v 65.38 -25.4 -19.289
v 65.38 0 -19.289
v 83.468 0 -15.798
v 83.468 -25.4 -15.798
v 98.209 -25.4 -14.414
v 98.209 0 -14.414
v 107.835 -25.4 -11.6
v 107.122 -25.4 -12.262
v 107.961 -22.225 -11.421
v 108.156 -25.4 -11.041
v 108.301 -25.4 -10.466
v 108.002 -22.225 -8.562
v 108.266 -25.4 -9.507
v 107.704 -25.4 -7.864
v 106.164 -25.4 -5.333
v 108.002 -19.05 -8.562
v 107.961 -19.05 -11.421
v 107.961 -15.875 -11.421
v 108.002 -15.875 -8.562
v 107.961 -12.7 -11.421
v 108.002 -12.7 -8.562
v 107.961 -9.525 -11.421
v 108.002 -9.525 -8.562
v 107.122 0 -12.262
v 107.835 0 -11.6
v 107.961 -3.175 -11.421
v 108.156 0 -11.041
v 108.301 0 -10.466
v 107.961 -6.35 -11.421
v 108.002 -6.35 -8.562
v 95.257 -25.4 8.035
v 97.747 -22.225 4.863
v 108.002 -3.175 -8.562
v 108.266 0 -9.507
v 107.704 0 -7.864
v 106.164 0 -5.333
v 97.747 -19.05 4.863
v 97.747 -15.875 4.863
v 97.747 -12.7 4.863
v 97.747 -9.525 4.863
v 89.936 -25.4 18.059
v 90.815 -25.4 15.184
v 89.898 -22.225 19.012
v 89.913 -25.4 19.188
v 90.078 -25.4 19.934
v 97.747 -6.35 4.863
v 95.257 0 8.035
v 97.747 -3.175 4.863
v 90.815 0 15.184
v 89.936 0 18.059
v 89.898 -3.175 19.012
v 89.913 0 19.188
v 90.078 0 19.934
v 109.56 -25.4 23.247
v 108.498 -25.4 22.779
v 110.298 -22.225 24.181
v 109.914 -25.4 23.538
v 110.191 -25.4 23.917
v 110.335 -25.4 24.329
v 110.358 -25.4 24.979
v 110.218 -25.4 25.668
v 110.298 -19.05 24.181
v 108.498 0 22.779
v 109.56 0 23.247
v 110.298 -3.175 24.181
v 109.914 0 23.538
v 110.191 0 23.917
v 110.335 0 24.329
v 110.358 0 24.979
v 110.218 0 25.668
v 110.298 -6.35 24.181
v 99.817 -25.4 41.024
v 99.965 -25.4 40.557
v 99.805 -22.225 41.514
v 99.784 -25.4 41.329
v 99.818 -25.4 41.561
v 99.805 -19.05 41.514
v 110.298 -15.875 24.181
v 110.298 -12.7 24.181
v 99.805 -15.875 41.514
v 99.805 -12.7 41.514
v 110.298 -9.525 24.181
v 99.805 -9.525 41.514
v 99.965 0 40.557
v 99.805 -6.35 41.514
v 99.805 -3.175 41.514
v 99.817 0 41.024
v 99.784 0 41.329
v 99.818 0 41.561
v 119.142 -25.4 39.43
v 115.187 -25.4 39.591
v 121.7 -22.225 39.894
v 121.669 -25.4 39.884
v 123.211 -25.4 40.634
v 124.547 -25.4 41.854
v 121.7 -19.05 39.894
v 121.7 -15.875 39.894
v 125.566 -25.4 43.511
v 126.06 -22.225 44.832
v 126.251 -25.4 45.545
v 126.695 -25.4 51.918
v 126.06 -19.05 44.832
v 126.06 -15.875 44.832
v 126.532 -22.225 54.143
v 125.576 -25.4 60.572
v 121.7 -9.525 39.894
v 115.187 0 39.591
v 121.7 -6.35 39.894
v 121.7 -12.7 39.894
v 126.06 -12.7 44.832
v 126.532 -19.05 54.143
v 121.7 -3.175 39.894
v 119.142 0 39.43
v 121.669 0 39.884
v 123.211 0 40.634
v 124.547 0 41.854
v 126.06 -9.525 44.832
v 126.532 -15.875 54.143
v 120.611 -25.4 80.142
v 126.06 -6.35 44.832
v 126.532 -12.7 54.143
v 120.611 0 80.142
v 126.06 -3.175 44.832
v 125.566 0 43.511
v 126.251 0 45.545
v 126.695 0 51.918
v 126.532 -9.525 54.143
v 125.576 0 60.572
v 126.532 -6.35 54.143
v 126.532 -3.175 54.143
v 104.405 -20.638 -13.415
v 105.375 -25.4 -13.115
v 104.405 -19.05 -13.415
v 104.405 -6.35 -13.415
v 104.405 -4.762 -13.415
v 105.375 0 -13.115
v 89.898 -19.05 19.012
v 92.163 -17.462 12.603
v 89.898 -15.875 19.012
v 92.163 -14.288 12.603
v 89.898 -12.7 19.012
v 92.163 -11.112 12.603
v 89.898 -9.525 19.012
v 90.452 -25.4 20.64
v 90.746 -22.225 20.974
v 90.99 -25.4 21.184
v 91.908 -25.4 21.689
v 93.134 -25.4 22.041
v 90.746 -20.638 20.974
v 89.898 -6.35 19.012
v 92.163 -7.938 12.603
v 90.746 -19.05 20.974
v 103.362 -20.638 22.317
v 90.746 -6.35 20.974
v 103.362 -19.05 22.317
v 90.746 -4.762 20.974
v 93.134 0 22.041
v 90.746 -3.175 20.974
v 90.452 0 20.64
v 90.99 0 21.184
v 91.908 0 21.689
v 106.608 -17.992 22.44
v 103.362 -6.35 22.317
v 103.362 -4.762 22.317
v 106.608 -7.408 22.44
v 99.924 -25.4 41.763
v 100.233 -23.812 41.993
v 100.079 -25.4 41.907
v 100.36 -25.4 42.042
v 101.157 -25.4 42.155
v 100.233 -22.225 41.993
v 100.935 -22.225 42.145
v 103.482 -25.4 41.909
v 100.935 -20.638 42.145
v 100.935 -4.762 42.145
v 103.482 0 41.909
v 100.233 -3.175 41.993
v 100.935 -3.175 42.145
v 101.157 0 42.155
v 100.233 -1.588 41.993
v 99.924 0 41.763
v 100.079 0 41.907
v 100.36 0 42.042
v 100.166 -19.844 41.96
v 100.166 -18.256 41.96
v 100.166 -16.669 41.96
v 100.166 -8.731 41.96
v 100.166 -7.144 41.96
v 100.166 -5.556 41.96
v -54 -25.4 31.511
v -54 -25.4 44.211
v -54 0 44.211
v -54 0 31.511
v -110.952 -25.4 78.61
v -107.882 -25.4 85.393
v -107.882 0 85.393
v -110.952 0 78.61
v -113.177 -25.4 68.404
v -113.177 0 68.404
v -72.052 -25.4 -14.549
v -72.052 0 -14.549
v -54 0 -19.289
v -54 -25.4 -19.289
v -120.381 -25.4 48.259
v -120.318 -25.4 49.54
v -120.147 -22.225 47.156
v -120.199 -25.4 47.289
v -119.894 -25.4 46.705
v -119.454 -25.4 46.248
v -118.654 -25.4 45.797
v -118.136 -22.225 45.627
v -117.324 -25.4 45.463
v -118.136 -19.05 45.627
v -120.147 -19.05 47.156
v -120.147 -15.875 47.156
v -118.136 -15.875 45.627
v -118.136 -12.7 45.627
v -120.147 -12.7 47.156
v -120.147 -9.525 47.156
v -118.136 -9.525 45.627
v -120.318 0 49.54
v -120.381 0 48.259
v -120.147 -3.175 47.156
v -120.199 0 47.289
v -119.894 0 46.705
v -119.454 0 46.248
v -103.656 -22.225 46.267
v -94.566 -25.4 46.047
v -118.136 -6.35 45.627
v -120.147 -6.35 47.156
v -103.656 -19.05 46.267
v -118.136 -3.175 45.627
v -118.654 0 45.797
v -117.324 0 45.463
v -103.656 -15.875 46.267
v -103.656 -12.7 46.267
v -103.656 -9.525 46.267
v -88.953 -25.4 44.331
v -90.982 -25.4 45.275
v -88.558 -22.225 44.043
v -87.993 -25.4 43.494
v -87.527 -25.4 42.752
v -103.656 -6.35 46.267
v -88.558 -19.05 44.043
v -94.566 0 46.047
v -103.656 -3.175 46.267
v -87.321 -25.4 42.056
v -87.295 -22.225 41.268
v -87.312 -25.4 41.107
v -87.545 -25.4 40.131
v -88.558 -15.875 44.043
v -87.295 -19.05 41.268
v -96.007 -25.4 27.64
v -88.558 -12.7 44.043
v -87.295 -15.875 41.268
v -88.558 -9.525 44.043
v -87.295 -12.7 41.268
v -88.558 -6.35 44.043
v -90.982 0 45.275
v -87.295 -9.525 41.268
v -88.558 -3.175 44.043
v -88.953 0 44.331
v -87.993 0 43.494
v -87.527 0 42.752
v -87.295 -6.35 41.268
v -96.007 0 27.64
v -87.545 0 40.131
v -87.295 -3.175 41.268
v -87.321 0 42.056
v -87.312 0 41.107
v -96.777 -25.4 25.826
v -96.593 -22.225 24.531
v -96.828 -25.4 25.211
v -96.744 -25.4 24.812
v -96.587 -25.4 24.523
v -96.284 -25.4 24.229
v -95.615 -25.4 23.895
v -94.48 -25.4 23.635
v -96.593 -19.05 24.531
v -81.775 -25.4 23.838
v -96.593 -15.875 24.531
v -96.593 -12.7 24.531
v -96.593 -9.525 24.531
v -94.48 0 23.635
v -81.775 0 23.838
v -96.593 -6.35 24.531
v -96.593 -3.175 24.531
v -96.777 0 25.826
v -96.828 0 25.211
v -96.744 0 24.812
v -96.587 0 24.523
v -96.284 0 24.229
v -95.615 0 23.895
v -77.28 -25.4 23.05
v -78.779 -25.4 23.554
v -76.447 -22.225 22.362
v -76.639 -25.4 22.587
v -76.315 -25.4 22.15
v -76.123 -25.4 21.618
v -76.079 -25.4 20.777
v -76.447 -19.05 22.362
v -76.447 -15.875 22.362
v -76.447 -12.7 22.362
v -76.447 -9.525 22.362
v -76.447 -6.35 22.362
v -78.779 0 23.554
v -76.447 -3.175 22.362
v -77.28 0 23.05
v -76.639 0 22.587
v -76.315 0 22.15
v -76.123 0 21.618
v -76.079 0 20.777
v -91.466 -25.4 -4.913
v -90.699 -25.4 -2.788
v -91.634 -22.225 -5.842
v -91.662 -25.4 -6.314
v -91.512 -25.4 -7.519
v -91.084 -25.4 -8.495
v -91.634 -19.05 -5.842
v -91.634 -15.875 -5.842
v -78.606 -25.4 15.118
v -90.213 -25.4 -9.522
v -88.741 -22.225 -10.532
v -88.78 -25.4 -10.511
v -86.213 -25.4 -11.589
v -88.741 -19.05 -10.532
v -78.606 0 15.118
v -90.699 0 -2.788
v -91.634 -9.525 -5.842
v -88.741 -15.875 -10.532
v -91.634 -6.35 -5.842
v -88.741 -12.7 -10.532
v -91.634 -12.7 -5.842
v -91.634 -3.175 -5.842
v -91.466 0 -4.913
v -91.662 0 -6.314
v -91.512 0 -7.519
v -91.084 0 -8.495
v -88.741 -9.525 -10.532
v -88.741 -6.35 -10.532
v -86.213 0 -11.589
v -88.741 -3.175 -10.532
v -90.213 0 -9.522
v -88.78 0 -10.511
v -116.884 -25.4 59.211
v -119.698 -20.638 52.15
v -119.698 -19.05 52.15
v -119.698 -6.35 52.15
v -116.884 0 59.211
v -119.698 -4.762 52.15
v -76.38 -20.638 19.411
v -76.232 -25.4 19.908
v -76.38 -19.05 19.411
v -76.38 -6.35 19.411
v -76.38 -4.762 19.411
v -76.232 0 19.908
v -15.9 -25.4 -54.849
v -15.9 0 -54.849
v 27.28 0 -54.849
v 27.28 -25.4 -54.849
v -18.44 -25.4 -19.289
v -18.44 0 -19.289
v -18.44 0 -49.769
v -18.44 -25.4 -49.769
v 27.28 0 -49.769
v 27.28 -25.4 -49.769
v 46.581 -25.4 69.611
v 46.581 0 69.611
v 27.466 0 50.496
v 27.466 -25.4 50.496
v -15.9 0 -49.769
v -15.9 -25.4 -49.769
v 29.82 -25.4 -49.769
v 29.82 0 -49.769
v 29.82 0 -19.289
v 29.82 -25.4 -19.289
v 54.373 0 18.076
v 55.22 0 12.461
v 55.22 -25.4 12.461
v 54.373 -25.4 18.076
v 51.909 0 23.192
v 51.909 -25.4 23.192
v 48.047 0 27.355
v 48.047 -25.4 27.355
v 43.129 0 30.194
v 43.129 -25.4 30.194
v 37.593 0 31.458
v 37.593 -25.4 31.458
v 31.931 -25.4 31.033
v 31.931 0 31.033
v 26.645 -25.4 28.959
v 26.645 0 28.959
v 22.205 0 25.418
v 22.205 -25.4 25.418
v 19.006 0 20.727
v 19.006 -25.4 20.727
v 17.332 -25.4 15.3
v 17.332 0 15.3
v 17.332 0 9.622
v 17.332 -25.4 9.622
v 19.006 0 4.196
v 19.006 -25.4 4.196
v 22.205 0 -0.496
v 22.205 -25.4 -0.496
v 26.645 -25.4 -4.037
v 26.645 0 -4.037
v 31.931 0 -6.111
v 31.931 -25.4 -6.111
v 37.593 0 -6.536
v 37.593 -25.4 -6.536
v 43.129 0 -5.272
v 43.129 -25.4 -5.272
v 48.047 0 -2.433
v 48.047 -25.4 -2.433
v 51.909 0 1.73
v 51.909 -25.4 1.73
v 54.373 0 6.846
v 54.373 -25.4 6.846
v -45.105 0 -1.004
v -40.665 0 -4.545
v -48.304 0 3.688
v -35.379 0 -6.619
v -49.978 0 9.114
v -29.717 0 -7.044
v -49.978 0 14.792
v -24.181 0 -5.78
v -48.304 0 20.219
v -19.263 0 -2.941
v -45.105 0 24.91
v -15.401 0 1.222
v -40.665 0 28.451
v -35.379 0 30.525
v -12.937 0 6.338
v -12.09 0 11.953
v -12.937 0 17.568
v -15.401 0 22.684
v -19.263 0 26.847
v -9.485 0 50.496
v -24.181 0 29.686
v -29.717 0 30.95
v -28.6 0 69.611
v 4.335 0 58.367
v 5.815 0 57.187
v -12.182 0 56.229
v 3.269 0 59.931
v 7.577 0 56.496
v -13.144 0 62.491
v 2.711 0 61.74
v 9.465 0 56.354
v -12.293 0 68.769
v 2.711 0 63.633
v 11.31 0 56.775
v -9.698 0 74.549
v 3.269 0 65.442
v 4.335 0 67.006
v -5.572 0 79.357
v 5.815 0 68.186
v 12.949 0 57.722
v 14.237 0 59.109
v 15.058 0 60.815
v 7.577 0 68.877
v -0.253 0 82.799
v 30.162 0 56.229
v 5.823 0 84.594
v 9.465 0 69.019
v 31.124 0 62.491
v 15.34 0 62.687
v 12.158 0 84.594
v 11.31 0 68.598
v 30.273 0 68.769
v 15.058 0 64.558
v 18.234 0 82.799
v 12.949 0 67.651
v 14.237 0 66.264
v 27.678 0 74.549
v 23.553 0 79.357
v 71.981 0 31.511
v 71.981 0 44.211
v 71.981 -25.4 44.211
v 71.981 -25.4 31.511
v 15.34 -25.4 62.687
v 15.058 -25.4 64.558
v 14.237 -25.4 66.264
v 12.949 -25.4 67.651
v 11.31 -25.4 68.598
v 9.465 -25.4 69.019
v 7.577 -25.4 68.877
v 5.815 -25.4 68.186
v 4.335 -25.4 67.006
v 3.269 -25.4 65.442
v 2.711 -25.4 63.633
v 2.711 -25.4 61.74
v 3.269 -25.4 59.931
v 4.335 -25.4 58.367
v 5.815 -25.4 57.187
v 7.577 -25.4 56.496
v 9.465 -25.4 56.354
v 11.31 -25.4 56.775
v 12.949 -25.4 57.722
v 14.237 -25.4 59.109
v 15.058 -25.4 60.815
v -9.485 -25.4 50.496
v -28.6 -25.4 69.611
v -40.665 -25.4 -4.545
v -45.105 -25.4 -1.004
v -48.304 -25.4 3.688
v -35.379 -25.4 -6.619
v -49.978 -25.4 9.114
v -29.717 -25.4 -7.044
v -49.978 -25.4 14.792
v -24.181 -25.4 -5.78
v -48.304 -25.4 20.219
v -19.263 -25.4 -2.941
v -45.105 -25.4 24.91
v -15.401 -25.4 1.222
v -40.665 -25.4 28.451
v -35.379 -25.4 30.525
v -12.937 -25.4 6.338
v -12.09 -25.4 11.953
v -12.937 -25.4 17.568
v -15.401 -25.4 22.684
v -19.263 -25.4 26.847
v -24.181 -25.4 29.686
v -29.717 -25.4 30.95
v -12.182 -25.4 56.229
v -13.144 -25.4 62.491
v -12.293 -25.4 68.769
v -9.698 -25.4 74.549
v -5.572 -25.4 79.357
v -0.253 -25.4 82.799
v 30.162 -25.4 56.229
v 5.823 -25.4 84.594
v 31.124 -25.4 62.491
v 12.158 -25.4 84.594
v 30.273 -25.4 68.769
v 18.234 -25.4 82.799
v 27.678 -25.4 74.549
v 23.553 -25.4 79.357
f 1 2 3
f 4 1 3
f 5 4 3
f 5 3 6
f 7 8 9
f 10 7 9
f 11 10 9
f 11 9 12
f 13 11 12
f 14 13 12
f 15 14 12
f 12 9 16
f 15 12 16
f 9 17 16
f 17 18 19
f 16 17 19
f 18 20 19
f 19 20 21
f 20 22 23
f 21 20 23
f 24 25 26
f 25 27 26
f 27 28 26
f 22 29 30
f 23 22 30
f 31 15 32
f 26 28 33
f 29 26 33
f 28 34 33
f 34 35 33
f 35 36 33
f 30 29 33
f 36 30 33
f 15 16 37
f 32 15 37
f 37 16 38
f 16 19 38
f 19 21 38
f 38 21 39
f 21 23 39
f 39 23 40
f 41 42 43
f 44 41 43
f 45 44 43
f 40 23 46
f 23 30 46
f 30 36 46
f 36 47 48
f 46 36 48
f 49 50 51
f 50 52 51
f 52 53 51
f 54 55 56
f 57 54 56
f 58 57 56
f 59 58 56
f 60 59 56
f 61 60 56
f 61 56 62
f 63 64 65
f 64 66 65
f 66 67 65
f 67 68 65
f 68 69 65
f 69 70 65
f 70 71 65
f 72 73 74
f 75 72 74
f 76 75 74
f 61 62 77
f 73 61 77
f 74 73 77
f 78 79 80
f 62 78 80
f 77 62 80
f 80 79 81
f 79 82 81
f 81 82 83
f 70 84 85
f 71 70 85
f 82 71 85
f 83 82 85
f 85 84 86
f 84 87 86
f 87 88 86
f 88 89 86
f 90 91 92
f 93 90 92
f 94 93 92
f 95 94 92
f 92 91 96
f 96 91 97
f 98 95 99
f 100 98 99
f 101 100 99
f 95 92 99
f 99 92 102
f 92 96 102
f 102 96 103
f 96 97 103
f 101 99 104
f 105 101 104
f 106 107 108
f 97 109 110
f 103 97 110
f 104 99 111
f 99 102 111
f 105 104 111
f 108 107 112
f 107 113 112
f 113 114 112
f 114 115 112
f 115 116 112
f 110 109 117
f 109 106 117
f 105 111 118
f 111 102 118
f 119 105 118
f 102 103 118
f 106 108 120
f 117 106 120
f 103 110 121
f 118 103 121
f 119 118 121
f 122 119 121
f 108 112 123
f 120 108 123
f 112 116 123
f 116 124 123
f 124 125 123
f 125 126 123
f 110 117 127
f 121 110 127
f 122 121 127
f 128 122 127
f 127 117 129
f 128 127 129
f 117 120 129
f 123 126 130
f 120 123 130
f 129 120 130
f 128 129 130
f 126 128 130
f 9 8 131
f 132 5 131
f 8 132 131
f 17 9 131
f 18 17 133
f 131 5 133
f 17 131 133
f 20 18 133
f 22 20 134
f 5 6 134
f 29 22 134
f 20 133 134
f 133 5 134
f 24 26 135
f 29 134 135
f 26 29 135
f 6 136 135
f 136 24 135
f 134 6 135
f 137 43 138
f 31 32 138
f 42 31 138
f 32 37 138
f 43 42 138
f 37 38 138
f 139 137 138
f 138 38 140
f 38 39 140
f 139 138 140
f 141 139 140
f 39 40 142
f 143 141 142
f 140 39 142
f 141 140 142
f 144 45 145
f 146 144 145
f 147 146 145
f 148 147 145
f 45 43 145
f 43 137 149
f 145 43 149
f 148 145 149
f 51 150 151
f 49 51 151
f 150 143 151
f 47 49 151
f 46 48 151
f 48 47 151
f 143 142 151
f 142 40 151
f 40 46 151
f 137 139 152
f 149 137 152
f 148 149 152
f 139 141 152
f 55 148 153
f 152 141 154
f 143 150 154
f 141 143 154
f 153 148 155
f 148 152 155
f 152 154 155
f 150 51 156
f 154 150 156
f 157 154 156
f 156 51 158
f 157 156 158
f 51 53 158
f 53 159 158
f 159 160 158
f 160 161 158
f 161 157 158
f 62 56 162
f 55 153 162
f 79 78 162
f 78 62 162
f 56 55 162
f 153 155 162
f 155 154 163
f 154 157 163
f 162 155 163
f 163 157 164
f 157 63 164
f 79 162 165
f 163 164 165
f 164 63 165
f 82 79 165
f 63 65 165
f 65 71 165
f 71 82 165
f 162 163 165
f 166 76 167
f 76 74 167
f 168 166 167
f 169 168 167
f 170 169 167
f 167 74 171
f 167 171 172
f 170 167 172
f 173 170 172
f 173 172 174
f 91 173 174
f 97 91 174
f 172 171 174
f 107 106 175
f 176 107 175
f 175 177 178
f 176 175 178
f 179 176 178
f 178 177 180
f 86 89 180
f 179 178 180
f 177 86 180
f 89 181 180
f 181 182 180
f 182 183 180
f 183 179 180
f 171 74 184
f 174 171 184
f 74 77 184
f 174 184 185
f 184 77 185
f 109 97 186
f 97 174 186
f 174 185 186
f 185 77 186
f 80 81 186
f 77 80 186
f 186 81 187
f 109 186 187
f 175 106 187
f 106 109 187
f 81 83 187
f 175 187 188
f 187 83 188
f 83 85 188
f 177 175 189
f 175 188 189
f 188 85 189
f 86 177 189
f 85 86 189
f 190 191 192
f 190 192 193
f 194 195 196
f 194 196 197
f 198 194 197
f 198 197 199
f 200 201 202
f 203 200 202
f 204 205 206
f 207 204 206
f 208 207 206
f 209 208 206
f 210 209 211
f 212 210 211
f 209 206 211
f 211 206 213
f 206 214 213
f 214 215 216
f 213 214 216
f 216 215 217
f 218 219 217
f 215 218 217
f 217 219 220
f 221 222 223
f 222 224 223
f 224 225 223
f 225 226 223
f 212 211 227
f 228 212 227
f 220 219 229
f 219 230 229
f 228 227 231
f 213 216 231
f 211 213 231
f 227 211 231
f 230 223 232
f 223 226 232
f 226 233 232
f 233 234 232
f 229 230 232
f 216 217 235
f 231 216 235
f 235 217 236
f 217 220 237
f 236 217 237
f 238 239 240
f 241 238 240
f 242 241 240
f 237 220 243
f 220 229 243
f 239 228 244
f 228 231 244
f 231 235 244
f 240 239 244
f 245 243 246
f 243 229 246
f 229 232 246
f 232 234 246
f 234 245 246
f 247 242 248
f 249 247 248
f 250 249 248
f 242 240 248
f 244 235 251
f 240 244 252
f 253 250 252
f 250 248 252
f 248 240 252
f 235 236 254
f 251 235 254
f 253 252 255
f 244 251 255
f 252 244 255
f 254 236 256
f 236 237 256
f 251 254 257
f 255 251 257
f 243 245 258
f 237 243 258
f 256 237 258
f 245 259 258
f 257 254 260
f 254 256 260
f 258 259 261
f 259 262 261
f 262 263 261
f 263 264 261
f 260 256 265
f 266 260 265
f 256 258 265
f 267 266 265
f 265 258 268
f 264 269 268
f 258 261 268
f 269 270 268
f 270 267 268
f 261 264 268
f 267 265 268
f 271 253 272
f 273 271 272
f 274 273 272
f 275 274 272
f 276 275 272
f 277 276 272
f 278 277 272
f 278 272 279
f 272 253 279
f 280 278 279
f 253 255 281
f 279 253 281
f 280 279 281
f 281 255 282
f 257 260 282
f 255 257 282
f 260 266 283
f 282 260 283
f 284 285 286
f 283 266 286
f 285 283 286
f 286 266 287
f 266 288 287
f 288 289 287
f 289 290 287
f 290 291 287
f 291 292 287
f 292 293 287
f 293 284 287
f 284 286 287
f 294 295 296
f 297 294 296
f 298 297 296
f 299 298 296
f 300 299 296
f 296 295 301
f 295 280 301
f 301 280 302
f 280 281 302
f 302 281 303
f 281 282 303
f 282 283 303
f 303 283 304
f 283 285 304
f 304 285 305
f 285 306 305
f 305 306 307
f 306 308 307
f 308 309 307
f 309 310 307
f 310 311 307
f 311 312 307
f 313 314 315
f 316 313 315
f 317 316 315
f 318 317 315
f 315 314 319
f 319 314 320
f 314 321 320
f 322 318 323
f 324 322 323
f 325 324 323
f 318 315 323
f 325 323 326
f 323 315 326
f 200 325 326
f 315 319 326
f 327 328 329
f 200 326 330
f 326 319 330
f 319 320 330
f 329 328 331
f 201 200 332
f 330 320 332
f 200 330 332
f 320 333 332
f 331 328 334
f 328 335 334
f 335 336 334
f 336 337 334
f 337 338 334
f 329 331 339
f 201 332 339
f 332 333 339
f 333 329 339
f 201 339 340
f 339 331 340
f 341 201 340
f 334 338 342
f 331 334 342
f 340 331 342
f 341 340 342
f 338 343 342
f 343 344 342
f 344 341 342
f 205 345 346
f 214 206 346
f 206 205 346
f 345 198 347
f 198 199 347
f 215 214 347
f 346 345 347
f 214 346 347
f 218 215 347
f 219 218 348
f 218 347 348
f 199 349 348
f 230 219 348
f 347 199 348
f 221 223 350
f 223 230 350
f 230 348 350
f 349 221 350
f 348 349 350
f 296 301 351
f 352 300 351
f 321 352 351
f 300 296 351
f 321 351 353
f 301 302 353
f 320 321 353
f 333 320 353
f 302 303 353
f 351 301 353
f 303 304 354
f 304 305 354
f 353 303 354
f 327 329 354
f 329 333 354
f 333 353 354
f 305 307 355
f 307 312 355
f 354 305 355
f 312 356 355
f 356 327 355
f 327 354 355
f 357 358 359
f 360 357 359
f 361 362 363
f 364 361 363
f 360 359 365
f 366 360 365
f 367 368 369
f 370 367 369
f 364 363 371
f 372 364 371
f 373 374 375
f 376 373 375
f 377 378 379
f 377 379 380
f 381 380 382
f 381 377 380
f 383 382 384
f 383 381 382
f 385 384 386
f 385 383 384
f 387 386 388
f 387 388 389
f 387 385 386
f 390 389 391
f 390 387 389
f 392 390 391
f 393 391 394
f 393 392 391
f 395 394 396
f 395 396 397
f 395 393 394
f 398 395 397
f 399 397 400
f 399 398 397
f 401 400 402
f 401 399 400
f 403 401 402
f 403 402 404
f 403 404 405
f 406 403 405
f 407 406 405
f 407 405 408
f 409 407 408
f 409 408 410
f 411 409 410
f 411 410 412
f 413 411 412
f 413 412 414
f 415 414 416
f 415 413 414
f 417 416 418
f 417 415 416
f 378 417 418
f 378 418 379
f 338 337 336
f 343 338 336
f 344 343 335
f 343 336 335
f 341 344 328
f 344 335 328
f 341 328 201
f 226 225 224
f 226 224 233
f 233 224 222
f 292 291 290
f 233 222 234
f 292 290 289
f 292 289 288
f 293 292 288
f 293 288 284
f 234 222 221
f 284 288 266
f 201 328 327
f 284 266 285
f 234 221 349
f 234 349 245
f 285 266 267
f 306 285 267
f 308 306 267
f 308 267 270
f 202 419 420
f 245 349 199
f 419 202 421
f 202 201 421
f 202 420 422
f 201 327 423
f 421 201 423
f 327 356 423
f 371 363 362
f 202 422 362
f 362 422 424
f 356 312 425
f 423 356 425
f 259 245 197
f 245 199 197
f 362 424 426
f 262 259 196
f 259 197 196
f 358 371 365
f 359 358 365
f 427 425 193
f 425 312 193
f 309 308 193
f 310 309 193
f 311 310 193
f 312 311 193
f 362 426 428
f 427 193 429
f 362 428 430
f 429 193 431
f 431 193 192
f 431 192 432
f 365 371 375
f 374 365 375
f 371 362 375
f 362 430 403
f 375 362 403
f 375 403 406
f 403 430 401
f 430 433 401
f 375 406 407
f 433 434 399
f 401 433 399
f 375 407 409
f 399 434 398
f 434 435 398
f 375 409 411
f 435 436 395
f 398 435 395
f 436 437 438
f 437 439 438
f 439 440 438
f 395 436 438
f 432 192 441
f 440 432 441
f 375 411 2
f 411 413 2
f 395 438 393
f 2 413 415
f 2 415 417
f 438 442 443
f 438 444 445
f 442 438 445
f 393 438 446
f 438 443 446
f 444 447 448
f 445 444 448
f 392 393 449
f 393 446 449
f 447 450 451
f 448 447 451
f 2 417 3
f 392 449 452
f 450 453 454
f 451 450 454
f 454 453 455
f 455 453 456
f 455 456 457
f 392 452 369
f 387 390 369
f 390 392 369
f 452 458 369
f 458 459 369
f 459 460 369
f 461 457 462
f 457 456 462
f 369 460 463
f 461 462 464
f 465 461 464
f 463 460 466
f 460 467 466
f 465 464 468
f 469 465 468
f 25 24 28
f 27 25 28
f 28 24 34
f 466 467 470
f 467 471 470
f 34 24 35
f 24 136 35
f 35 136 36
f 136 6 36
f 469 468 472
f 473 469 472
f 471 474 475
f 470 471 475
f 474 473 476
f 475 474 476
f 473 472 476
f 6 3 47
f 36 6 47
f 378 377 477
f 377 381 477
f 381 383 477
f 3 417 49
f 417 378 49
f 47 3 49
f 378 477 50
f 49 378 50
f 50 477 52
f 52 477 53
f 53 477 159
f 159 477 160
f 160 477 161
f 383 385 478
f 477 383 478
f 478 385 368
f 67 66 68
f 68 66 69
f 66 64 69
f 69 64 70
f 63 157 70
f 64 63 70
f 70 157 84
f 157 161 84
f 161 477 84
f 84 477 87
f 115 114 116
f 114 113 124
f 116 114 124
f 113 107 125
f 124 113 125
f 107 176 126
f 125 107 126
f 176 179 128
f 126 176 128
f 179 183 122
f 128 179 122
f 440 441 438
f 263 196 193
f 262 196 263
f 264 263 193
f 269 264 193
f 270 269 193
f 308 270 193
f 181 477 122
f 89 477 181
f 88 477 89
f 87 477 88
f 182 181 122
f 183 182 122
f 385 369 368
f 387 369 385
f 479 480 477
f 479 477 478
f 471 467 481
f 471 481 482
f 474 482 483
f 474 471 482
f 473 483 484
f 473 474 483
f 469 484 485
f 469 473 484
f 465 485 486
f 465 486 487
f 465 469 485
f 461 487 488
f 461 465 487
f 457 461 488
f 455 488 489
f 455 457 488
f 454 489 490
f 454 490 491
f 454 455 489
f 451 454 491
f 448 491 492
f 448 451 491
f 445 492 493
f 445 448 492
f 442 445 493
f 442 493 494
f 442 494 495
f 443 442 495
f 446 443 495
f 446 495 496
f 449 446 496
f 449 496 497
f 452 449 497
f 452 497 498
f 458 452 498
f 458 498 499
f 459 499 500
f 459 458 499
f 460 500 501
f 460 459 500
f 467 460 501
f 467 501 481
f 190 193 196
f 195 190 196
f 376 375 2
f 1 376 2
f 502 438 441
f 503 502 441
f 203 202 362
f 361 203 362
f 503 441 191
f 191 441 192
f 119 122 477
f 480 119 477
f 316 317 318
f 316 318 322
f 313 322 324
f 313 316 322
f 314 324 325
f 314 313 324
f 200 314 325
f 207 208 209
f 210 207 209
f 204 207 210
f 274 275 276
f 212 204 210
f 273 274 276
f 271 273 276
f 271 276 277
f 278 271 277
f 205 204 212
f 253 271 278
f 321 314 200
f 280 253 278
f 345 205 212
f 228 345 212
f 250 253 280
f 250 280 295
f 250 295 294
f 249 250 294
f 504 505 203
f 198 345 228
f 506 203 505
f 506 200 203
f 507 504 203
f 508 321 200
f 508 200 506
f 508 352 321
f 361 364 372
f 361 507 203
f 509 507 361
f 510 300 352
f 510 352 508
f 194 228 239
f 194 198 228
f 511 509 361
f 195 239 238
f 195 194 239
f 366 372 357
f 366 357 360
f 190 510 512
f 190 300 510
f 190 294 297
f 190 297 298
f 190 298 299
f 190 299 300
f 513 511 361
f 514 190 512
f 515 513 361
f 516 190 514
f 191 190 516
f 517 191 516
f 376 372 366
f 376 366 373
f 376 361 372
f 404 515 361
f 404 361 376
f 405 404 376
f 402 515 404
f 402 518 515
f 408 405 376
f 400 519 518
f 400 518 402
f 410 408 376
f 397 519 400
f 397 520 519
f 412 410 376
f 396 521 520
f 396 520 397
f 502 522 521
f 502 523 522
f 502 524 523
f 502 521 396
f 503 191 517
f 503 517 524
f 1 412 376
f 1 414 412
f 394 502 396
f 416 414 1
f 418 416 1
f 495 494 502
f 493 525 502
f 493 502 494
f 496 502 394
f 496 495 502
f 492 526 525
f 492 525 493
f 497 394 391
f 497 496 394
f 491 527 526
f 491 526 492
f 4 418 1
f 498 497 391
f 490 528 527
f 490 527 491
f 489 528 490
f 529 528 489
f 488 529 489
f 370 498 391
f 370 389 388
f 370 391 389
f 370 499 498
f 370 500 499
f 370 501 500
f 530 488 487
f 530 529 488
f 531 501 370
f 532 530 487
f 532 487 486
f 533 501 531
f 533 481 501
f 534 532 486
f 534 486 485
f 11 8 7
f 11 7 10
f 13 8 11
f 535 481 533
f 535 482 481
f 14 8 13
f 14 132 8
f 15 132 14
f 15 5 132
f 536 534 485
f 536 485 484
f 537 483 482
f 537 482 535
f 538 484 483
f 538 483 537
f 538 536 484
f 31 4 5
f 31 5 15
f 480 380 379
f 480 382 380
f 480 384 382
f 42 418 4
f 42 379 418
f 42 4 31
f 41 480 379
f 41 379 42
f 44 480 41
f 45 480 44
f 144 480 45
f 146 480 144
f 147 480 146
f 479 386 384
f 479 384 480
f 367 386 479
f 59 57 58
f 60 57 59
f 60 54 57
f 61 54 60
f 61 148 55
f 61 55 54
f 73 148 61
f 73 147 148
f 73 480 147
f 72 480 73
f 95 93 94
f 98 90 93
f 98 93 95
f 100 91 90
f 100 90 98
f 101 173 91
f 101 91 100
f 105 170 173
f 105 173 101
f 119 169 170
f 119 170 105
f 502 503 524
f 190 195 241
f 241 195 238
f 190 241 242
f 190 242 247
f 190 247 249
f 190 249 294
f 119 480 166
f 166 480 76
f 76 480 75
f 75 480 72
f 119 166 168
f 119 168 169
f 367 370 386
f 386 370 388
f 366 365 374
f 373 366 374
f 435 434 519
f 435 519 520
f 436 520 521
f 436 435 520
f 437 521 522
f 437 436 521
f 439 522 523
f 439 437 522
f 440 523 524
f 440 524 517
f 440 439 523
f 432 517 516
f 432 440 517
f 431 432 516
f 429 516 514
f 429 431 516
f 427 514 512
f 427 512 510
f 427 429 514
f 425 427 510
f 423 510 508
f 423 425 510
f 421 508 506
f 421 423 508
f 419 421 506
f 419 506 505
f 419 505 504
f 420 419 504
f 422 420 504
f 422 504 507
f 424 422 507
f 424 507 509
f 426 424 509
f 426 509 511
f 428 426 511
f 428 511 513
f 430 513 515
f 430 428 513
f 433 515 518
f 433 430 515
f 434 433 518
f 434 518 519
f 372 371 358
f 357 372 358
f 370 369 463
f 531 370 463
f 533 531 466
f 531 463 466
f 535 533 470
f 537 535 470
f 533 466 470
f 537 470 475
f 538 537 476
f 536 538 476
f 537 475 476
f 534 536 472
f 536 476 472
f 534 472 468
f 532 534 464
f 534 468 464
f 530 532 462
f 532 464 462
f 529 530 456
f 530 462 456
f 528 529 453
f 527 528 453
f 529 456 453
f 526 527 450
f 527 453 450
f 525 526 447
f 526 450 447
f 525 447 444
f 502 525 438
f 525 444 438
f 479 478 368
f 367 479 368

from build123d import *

# Parameters (mm, degrees)
F0_R     = 19.05
F0_R_2   = 6.35
F1_DEPTH = 25.4


with BuildPart() as f1:
    # F0 (on Front) → F1 (new body)
    with BuildSketch(Plane.XZ):
        with BuildLine():
            Line((-31.1403993189, -19.2889107381), (-18.4403993189, -19.2889107381))
            Line((-18.4403993189, -19.2889107381), (-18.4403993189, -49.7689107381))
            Line((-18.4403993189, -49.7689107381), (-15.9003993189, -49.7689107381))
            Line((-15.9003993189, -49.7689107381), (-15.9003993189, -54.8489107381))
            Line((-15.9003993189, -54.8489107381), (27.2796006811, -54.8489107381))
            Line((27.2796006811, -54.8489107381), (27.2796006811, -49.7689107381))
            Line((27.2796006811, -49.7689107381), (29.8196006811, -49.7689107381))
            Line((29.8196006811, -49.7689107381), (29.8196006811, -19.2889107381))
            Line((29.8196006811, -19.2889107381), (36.1696006811, -19.2889107381))
            Line((36.1696006811, -19.2889107381), (65.3796006811, -19.2889107381))
            add(Edge.make_bspline(
                [(65.3796006811, -19.2889107381), (74.1711477056, -18.4765076882), (82.4192640819, -14.20656882), (116.8758285004, -15.0036093337), (97.2985200049, 3.7811899612), (82.3009794217, 26.9441888583), (123.3015282631, 17.1872348013), (86.4868084349, 50.4668270695), (134.1376124005, 28.9247435809), (126.009155263, 61.4430774902), (120.6114375598, 80.1416121068)],
                knots=[0, 0, 0, 0, 0.1198813127, 0.2438537091, 0.3587527346, 0.4691736005, 0.5838440992, 0.7018104794, 0.8246059311, 0.9870158859, 0.9870158859, 0.9870158859, 0.9870158859], degree=3))
            Line((120.6114375598, 80.1416121068), (71.9809147149, 31.5110892619))
            Line((71.9809147149, 31.5110892619), (71.9809147149, 44.2110892619))
            Line((71.9809147149, 44.2110892619), (46.5809147149, 69.6110892619))
            Line((46.5809147149, 69.6110892619), (27.4656911399, 50.4958656869))
            ThreePointArc((27.4656911399, 50.4958656869), (8.990257698, 84.8214218311), (-9.4851757439, 50.4958656869))
            Line((-9.4851757439, 50.4958656869), (-28.6003993189, 69.6110892619))
            Line((-28.6003993189, 69.6110892619), (-54.0003993189, 44.2110892619))
            Line((-54.0003993189, 44.2110892619), (-54.0003993189, 31.5110892619))
            Line((-54.0003993189, 31.5110892619), (-107.8819360453, 85.3926259883))
            add(Edge.make_bspline(
                [(-107.8819360453, 85.3926259883), (-112.2818173927, 78.3663890112), (-110.085708008, 70.0693718999), (-126.8158954841, 42.1679327702), (-104.898938529, 47.4714553572), (-77.2689362901, 45.1833089905), (-109.7289109331, 17.813986501), (-59.3397233326, 30.922949596), (-110.4212413639, -16.343253291), (-72.5500955974, -12.1461893014), (-54.0003993189, -19.2889107381)],
                knots=[0, 0, 0, 0, 0.1125650032, 0.2355803588, 0.3402847219, 0.4511527294, 0.5662875782, 0.684731655, 0.8336567375, 1, 1, 1, 1], degree=3))
            Line((-54.0003993189, -19.2889107381), (-31.1403993189, -19.2889107381))
        make_face()
        with Locations((-31.1403993189, 11.9530892619)):
            Circle(F0_R, mode=Mode.SUBTRACT)
        with Locations((36.1696006811, 12.4610892619)):
            Circle(F0_R, mode=Mode.SUBTRACT)
        with BuildLine():
            ThreePointArc((-3.2003993189, 44.2110892619), (-6.6614795757, 47.0347854301), (-9.4851757439, 50.4958656869))
            Line((-9.4851757439, 50.4958656869), (-3.2003993189, 44.2110892619))
        make_face(mode=Mode.SUBTRACT)
        with BuildLine():
            Line((21.1809147149, 44.2110892619), (27.4656911399, 50.4958656869))
            ThreePointArc((27.4656911399, 50.4958656869), (24.6419949717, 47.0347854301), (21.1809147149, 44.2110892619))
        make_face(mode=Mode.SUBTRACT)
        with Locations((8.990257698, 62.6865227039)):
            Circle(F0_R_2, mode=Mode.SUBTRACT)
        with BuildLine():
            ThreePointArc((21.1809147149, 44.2110892619), (24.6419949717, 47.0347854301), (27.4656911399, 50.4958656869))
            Line((27.4656911399, 50.4958656869), (21.1809147149, 44.2110892619))
        make_face()
        with BuildLine():
            Line((-3.2003993189, 44.2110892619), (-9.4851757439, 50.4958656869))
            ThreePointArc((-9.4851757439, 50.4958656869), (-6.6614795757, 47.0347854301), (-3.2003993189, 44.2110892619))
        make_face()
    extrude(amount=F1_DEPTH)


solid = f1.part
